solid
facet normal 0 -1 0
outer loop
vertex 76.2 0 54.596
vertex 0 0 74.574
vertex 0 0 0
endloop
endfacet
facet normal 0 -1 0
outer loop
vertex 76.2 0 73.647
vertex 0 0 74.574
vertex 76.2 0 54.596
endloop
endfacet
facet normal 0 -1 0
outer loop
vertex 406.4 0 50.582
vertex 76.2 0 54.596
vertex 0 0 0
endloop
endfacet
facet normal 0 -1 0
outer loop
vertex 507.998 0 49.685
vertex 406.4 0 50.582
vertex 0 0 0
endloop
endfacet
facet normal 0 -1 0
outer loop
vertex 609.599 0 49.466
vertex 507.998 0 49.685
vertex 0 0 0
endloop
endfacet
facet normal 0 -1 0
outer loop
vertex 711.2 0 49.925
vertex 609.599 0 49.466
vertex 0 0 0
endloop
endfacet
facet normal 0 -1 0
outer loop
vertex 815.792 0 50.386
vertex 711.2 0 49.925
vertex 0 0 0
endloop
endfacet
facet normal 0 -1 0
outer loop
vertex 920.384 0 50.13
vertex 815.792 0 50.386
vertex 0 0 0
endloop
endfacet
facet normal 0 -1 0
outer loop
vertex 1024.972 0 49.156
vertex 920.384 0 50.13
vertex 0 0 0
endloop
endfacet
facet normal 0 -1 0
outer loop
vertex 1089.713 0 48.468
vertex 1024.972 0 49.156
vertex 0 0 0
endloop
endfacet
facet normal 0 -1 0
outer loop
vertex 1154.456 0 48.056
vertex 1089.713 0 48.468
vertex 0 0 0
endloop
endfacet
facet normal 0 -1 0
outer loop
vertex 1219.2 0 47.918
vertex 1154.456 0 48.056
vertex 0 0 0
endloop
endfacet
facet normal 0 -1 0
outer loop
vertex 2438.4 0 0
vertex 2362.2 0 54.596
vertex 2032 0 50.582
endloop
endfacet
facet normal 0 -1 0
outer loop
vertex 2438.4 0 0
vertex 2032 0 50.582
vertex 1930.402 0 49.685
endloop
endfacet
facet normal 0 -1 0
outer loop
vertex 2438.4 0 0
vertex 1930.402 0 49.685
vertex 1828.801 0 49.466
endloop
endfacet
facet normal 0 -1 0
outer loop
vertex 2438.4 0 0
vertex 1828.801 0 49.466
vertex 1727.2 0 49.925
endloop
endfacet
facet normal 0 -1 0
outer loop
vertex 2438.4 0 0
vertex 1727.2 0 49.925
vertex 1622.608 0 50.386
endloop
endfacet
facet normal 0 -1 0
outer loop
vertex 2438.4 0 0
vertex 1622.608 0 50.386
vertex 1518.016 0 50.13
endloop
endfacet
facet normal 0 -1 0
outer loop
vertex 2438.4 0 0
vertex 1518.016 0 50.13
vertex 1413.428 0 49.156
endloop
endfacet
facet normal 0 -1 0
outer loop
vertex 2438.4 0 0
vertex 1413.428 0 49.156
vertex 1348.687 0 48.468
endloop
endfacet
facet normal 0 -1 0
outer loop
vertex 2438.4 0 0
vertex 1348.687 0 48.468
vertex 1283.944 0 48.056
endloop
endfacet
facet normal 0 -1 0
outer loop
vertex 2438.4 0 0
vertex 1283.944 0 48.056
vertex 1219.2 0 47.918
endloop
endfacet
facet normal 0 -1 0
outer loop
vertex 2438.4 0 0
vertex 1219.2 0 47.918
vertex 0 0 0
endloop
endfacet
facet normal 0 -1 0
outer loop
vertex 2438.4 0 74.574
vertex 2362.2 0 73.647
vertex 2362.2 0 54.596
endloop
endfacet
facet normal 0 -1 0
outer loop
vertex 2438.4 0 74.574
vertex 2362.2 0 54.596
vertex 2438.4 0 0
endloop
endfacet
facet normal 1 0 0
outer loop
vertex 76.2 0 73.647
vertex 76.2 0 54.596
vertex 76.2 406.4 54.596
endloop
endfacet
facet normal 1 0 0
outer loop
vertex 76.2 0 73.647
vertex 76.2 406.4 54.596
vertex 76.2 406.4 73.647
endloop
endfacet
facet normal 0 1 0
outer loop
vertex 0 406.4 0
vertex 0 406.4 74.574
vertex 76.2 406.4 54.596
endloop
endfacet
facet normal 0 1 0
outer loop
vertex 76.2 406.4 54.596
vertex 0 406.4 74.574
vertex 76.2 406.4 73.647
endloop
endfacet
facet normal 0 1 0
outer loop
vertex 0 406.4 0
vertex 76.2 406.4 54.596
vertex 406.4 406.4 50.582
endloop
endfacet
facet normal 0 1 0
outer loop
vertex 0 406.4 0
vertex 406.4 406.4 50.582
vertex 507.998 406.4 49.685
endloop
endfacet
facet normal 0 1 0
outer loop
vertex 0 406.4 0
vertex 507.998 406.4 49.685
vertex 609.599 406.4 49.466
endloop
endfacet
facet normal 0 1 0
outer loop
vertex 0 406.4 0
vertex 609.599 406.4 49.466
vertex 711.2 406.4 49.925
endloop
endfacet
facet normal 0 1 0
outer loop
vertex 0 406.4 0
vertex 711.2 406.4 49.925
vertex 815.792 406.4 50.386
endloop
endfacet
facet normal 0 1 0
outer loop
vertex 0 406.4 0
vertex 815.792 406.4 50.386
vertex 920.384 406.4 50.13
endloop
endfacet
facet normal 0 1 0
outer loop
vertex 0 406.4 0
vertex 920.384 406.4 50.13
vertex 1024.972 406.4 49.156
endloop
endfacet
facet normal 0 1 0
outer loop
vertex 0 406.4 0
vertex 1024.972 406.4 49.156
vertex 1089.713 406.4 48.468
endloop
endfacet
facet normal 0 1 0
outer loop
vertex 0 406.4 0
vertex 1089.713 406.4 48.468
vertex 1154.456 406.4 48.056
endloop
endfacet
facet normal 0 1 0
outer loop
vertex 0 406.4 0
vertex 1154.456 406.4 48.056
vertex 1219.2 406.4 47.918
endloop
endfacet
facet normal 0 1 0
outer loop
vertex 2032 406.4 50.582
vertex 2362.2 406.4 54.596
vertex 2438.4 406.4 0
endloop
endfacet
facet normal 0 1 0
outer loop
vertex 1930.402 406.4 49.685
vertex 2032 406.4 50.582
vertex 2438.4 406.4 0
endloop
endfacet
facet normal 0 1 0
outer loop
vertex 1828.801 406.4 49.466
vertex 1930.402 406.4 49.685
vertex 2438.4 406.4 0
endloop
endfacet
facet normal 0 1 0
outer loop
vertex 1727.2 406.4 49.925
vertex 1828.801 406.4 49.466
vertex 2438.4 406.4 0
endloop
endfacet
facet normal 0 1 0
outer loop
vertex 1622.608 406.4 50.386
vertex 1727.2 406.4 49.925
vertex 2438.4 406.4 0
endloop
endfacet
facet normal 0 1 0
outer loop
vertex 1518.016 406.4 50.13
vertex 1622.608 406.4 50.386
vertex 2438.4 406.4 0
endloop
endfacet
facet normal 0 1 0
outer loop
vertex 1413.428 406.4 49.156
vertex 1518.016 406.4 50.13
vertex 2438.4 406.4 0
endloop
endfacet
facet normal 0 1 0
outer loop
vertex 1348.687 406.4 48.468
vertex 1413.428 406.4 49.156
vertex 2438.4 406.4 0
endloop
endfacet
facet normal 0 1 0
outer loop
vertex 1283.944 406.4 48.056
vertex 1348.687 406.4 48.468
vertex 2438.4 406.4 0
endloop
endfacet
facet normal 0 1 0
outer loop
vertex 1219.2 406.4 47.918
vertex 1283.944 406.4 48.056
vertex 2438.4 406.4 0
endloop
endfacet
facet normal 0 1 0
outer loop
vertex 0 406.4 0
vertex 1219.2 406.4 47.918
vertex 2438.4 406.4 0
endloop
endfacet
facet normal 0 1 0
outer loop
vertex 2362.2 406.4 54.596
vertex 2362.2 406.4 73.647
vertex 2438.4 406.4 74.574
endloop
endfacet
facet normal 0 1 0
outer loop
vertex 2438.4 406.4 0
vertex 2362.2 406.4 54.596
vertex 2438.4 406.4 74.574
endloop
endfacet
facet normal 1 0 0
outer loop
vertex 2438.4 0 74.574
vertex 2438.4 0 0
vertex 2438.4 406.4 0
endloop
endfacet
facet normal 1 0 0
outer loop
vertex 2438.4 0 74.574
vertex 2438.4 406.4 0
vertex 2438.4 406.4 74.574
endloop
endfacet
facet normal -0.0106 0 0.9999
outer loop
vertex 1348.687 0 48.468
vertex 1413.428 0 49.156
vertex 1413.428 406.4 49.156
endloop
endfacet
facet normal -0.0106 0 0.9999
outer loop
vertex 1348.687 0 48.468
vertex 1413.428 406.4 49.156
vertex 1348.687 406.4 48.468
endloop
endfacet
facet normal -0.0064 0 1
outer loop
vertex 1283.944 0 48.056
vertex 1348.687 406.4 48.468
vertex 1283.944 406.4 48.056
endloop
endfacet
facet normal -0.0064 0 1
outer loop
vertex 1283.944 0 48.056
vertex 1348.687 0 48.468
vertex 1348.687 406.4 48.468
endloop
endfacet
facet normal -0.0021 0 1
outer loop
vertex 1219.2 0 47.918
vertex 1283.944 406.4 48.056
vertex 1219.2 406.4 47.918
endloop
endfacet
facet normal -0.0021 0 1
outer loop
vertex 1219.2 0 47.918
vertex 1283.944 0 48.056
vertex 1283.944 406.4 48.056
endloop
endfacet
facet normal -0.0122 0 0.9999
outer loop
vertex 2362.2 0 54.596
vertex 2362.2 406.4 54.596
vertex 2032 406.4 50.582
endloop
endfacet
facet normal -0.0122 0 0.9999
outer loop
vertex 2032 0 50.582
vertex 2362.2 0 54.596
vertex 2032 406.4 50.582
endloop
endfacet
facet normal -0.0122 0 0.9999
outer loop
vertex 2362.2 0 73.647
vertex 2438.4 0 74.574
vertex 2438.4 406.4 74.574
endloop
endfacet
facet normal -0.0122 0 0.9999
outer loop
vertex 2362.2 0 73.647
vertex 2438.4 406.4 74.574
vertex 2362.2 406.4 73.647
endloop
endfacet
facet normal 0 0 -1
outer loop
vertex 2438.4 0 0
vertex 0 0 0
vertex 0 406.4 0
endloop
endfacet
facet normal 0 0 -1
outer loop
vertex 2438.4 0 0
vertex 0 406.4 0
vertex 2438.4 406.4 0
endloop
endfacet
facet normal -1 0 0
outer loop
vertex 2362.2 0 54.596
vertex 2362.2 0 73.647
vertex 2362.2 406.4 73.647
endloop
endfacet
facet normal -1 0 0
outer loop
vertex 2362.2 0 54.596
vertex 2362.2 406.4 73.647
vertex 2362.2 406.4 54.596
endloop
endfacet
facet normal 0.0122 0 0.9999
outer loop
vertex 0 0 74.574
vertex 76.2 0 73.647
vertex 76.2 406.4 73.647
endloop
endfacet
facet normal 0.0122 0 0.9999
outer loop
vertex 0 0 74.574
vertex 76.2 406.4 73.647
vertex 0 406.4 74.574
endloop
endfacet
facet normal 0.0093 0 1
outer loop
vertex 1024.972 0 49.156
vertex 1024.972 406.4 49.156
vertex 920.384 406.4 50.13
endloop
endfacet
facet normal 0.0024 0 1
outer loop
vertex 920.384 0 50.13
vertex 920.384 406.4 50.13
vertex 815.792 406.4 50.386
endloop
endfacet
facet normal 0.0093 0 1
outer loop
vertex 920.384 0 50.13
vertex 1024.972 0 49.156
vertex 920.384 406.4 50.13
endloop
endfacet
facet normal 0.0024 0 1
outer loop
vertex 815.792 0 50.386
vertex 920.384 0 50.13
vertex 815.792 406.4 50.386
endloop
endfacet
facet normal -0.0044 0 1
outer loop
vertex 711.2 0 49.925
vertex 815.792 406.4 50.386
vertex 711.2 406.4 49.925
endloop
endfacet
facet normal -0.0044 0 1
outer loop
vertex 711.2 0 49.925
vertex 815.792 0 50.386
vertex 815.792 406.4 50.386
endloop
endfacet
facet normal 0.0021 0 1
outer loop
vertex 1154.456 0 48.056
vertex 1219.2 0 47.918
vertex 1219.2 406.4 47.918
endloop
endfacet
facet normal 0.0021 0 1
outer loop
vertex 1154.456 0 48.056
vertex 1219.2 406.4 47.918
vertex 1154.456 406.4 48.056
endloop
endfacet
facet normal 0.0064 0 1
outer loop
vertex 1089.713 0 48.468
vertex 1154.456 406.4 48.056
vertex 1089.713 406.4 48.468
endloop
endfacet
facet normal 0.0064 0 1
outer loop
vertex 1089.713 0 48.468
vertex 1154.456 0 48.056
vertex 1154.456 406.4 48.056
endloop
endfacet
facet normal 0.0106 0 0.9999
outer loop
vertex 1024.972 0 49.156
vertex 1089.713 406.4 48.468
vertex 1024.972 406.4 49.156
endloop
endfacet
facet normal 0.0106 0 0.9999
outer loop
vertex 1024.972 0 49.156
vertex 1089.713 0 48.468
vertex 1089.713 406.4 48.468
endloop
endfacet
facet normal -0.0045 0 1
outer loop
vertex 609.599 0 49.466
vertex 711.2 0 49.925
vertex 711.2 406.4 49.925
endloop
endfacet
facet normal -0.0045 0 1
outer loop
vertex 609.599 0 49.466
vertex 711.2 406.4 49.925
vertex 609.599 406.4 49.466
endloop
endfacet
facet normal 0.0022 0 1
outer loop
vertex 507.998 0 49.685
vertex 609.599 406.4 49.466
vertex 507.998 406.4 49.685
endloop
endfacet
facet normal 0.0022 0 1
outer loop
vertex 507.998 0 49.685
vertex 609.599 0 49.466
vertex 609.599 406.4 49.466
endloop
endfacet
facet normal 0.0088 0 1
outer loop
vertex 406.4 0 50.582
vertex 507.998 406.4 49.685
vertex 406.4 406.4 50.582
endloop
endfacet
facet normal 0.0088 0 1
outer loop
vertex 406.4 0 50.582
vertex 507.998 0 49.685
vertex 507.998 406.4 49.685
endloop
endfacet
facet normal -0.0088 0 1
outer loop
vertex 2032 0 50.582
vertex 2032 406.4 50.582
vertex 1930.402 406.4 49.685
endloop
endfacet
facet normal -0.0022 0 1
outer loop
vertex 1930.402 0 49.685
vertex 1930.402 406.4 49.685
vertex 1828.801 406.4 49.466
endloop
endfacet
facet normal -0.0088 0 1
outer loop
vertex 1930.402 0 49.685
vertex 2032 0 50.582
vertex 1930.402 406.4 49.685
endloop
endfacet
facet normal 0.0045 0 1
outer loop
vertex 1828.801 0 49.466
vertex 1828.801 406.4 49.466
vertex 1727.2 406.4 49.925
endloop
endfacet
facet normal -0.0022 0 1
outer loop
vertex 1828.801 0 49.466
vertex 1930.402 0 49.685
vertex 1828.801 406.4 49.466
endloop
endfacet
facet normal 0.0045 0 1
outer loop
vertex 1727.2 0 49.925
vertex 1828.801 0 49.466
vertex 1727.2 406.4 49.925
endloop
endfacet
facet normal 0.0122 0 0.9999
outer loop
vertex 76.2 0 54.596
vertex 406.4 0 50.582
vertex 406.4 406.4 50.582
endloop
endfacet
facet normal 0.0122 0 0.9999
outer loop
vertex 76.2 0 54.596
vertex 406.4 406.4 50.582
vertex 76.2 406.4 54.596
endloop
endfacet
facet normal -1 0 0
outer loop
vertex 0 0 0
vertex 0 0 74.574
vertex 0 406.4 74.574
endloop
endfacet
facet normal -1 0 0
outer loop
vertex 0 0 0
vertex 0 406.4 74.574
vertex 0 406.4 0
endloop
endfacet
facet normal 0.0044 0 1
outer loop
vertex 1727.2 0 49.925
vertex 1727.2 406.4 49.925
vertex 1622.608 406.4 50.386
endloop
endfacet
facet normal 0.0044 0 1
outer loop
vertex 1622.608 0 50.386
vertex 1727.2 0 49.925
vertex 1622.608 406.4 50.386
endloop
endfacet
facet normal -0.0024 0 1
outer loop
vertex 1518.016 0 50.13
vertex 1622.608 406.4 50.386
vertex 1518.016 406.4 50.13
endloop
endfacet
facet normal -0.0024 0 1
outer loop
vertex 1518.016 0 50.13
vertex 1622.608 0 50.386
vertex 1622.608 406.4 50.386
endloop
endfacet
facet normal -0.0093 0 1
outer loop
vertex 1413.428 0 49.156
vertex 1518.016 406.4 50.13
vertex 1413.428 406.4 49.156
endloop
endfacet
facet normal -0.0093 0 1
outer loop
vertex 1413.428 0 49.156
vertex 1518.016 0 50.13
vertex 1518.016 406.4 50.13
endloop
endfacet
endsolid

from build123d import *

# Parameters (mm, degrees)
F1_DEPTH = 406.4


with BuildPart() as f1:
    # F0 (on Front) → F1 (new body)
    with BuildSketch(Plane.XZ):
        with BuildLine():
            Line((0, 55.52242), (0, 0))
            Line((0, 0), (2438.4, 0))
            Line((2438.4, 0), (2438.4, 55.52242))
            Line((2438.4, 55.52242), (2438.4, 74.573828))
            Line((2438.4, 74.573828), (2362.2, 73.647479))
            Line((2362.2, 73.647479), (2362.2, 54.596071))
            Line((2362.2, 54.596071), (2032, 50.581893))
            ThreePointArc((2032, 50.581893), (1879.601643, 49.491294), (1727.2, 49.924736))
            ThreePointArc((1727.2, 49.924736), (1570.312045, 50.347846), (1413.428048, 49.155868))
            ThreePointArc((1413.428048, 49.155868), (1316.315996, 48.227572), (1219.2, 47.918136))
            ThreePointArc((1219.2, 47.918136), (1122.084004, 48.227572), (1024.971952, 49.155868))
            ThreePointArc((1024.971952, 49.155868), (868.087955, 50.347846), (711.2, 49.924736))
            ThreePointArc((711.2, 49.924736), (558.798357, 49.491294), (406.4, 50.581893))
            Line((406.4, 50.581893), (76.2, 54.596071))
            Line((76.2, 54.596071), (76.2, 73.647479))
            Line((76.2, 73.647479), (0, 74.573828))
            Line((0, 74.573828), (0, 55.52242))
        make_face()
    extrude(amount=-F1_DEPTH)


solid = f1.part
